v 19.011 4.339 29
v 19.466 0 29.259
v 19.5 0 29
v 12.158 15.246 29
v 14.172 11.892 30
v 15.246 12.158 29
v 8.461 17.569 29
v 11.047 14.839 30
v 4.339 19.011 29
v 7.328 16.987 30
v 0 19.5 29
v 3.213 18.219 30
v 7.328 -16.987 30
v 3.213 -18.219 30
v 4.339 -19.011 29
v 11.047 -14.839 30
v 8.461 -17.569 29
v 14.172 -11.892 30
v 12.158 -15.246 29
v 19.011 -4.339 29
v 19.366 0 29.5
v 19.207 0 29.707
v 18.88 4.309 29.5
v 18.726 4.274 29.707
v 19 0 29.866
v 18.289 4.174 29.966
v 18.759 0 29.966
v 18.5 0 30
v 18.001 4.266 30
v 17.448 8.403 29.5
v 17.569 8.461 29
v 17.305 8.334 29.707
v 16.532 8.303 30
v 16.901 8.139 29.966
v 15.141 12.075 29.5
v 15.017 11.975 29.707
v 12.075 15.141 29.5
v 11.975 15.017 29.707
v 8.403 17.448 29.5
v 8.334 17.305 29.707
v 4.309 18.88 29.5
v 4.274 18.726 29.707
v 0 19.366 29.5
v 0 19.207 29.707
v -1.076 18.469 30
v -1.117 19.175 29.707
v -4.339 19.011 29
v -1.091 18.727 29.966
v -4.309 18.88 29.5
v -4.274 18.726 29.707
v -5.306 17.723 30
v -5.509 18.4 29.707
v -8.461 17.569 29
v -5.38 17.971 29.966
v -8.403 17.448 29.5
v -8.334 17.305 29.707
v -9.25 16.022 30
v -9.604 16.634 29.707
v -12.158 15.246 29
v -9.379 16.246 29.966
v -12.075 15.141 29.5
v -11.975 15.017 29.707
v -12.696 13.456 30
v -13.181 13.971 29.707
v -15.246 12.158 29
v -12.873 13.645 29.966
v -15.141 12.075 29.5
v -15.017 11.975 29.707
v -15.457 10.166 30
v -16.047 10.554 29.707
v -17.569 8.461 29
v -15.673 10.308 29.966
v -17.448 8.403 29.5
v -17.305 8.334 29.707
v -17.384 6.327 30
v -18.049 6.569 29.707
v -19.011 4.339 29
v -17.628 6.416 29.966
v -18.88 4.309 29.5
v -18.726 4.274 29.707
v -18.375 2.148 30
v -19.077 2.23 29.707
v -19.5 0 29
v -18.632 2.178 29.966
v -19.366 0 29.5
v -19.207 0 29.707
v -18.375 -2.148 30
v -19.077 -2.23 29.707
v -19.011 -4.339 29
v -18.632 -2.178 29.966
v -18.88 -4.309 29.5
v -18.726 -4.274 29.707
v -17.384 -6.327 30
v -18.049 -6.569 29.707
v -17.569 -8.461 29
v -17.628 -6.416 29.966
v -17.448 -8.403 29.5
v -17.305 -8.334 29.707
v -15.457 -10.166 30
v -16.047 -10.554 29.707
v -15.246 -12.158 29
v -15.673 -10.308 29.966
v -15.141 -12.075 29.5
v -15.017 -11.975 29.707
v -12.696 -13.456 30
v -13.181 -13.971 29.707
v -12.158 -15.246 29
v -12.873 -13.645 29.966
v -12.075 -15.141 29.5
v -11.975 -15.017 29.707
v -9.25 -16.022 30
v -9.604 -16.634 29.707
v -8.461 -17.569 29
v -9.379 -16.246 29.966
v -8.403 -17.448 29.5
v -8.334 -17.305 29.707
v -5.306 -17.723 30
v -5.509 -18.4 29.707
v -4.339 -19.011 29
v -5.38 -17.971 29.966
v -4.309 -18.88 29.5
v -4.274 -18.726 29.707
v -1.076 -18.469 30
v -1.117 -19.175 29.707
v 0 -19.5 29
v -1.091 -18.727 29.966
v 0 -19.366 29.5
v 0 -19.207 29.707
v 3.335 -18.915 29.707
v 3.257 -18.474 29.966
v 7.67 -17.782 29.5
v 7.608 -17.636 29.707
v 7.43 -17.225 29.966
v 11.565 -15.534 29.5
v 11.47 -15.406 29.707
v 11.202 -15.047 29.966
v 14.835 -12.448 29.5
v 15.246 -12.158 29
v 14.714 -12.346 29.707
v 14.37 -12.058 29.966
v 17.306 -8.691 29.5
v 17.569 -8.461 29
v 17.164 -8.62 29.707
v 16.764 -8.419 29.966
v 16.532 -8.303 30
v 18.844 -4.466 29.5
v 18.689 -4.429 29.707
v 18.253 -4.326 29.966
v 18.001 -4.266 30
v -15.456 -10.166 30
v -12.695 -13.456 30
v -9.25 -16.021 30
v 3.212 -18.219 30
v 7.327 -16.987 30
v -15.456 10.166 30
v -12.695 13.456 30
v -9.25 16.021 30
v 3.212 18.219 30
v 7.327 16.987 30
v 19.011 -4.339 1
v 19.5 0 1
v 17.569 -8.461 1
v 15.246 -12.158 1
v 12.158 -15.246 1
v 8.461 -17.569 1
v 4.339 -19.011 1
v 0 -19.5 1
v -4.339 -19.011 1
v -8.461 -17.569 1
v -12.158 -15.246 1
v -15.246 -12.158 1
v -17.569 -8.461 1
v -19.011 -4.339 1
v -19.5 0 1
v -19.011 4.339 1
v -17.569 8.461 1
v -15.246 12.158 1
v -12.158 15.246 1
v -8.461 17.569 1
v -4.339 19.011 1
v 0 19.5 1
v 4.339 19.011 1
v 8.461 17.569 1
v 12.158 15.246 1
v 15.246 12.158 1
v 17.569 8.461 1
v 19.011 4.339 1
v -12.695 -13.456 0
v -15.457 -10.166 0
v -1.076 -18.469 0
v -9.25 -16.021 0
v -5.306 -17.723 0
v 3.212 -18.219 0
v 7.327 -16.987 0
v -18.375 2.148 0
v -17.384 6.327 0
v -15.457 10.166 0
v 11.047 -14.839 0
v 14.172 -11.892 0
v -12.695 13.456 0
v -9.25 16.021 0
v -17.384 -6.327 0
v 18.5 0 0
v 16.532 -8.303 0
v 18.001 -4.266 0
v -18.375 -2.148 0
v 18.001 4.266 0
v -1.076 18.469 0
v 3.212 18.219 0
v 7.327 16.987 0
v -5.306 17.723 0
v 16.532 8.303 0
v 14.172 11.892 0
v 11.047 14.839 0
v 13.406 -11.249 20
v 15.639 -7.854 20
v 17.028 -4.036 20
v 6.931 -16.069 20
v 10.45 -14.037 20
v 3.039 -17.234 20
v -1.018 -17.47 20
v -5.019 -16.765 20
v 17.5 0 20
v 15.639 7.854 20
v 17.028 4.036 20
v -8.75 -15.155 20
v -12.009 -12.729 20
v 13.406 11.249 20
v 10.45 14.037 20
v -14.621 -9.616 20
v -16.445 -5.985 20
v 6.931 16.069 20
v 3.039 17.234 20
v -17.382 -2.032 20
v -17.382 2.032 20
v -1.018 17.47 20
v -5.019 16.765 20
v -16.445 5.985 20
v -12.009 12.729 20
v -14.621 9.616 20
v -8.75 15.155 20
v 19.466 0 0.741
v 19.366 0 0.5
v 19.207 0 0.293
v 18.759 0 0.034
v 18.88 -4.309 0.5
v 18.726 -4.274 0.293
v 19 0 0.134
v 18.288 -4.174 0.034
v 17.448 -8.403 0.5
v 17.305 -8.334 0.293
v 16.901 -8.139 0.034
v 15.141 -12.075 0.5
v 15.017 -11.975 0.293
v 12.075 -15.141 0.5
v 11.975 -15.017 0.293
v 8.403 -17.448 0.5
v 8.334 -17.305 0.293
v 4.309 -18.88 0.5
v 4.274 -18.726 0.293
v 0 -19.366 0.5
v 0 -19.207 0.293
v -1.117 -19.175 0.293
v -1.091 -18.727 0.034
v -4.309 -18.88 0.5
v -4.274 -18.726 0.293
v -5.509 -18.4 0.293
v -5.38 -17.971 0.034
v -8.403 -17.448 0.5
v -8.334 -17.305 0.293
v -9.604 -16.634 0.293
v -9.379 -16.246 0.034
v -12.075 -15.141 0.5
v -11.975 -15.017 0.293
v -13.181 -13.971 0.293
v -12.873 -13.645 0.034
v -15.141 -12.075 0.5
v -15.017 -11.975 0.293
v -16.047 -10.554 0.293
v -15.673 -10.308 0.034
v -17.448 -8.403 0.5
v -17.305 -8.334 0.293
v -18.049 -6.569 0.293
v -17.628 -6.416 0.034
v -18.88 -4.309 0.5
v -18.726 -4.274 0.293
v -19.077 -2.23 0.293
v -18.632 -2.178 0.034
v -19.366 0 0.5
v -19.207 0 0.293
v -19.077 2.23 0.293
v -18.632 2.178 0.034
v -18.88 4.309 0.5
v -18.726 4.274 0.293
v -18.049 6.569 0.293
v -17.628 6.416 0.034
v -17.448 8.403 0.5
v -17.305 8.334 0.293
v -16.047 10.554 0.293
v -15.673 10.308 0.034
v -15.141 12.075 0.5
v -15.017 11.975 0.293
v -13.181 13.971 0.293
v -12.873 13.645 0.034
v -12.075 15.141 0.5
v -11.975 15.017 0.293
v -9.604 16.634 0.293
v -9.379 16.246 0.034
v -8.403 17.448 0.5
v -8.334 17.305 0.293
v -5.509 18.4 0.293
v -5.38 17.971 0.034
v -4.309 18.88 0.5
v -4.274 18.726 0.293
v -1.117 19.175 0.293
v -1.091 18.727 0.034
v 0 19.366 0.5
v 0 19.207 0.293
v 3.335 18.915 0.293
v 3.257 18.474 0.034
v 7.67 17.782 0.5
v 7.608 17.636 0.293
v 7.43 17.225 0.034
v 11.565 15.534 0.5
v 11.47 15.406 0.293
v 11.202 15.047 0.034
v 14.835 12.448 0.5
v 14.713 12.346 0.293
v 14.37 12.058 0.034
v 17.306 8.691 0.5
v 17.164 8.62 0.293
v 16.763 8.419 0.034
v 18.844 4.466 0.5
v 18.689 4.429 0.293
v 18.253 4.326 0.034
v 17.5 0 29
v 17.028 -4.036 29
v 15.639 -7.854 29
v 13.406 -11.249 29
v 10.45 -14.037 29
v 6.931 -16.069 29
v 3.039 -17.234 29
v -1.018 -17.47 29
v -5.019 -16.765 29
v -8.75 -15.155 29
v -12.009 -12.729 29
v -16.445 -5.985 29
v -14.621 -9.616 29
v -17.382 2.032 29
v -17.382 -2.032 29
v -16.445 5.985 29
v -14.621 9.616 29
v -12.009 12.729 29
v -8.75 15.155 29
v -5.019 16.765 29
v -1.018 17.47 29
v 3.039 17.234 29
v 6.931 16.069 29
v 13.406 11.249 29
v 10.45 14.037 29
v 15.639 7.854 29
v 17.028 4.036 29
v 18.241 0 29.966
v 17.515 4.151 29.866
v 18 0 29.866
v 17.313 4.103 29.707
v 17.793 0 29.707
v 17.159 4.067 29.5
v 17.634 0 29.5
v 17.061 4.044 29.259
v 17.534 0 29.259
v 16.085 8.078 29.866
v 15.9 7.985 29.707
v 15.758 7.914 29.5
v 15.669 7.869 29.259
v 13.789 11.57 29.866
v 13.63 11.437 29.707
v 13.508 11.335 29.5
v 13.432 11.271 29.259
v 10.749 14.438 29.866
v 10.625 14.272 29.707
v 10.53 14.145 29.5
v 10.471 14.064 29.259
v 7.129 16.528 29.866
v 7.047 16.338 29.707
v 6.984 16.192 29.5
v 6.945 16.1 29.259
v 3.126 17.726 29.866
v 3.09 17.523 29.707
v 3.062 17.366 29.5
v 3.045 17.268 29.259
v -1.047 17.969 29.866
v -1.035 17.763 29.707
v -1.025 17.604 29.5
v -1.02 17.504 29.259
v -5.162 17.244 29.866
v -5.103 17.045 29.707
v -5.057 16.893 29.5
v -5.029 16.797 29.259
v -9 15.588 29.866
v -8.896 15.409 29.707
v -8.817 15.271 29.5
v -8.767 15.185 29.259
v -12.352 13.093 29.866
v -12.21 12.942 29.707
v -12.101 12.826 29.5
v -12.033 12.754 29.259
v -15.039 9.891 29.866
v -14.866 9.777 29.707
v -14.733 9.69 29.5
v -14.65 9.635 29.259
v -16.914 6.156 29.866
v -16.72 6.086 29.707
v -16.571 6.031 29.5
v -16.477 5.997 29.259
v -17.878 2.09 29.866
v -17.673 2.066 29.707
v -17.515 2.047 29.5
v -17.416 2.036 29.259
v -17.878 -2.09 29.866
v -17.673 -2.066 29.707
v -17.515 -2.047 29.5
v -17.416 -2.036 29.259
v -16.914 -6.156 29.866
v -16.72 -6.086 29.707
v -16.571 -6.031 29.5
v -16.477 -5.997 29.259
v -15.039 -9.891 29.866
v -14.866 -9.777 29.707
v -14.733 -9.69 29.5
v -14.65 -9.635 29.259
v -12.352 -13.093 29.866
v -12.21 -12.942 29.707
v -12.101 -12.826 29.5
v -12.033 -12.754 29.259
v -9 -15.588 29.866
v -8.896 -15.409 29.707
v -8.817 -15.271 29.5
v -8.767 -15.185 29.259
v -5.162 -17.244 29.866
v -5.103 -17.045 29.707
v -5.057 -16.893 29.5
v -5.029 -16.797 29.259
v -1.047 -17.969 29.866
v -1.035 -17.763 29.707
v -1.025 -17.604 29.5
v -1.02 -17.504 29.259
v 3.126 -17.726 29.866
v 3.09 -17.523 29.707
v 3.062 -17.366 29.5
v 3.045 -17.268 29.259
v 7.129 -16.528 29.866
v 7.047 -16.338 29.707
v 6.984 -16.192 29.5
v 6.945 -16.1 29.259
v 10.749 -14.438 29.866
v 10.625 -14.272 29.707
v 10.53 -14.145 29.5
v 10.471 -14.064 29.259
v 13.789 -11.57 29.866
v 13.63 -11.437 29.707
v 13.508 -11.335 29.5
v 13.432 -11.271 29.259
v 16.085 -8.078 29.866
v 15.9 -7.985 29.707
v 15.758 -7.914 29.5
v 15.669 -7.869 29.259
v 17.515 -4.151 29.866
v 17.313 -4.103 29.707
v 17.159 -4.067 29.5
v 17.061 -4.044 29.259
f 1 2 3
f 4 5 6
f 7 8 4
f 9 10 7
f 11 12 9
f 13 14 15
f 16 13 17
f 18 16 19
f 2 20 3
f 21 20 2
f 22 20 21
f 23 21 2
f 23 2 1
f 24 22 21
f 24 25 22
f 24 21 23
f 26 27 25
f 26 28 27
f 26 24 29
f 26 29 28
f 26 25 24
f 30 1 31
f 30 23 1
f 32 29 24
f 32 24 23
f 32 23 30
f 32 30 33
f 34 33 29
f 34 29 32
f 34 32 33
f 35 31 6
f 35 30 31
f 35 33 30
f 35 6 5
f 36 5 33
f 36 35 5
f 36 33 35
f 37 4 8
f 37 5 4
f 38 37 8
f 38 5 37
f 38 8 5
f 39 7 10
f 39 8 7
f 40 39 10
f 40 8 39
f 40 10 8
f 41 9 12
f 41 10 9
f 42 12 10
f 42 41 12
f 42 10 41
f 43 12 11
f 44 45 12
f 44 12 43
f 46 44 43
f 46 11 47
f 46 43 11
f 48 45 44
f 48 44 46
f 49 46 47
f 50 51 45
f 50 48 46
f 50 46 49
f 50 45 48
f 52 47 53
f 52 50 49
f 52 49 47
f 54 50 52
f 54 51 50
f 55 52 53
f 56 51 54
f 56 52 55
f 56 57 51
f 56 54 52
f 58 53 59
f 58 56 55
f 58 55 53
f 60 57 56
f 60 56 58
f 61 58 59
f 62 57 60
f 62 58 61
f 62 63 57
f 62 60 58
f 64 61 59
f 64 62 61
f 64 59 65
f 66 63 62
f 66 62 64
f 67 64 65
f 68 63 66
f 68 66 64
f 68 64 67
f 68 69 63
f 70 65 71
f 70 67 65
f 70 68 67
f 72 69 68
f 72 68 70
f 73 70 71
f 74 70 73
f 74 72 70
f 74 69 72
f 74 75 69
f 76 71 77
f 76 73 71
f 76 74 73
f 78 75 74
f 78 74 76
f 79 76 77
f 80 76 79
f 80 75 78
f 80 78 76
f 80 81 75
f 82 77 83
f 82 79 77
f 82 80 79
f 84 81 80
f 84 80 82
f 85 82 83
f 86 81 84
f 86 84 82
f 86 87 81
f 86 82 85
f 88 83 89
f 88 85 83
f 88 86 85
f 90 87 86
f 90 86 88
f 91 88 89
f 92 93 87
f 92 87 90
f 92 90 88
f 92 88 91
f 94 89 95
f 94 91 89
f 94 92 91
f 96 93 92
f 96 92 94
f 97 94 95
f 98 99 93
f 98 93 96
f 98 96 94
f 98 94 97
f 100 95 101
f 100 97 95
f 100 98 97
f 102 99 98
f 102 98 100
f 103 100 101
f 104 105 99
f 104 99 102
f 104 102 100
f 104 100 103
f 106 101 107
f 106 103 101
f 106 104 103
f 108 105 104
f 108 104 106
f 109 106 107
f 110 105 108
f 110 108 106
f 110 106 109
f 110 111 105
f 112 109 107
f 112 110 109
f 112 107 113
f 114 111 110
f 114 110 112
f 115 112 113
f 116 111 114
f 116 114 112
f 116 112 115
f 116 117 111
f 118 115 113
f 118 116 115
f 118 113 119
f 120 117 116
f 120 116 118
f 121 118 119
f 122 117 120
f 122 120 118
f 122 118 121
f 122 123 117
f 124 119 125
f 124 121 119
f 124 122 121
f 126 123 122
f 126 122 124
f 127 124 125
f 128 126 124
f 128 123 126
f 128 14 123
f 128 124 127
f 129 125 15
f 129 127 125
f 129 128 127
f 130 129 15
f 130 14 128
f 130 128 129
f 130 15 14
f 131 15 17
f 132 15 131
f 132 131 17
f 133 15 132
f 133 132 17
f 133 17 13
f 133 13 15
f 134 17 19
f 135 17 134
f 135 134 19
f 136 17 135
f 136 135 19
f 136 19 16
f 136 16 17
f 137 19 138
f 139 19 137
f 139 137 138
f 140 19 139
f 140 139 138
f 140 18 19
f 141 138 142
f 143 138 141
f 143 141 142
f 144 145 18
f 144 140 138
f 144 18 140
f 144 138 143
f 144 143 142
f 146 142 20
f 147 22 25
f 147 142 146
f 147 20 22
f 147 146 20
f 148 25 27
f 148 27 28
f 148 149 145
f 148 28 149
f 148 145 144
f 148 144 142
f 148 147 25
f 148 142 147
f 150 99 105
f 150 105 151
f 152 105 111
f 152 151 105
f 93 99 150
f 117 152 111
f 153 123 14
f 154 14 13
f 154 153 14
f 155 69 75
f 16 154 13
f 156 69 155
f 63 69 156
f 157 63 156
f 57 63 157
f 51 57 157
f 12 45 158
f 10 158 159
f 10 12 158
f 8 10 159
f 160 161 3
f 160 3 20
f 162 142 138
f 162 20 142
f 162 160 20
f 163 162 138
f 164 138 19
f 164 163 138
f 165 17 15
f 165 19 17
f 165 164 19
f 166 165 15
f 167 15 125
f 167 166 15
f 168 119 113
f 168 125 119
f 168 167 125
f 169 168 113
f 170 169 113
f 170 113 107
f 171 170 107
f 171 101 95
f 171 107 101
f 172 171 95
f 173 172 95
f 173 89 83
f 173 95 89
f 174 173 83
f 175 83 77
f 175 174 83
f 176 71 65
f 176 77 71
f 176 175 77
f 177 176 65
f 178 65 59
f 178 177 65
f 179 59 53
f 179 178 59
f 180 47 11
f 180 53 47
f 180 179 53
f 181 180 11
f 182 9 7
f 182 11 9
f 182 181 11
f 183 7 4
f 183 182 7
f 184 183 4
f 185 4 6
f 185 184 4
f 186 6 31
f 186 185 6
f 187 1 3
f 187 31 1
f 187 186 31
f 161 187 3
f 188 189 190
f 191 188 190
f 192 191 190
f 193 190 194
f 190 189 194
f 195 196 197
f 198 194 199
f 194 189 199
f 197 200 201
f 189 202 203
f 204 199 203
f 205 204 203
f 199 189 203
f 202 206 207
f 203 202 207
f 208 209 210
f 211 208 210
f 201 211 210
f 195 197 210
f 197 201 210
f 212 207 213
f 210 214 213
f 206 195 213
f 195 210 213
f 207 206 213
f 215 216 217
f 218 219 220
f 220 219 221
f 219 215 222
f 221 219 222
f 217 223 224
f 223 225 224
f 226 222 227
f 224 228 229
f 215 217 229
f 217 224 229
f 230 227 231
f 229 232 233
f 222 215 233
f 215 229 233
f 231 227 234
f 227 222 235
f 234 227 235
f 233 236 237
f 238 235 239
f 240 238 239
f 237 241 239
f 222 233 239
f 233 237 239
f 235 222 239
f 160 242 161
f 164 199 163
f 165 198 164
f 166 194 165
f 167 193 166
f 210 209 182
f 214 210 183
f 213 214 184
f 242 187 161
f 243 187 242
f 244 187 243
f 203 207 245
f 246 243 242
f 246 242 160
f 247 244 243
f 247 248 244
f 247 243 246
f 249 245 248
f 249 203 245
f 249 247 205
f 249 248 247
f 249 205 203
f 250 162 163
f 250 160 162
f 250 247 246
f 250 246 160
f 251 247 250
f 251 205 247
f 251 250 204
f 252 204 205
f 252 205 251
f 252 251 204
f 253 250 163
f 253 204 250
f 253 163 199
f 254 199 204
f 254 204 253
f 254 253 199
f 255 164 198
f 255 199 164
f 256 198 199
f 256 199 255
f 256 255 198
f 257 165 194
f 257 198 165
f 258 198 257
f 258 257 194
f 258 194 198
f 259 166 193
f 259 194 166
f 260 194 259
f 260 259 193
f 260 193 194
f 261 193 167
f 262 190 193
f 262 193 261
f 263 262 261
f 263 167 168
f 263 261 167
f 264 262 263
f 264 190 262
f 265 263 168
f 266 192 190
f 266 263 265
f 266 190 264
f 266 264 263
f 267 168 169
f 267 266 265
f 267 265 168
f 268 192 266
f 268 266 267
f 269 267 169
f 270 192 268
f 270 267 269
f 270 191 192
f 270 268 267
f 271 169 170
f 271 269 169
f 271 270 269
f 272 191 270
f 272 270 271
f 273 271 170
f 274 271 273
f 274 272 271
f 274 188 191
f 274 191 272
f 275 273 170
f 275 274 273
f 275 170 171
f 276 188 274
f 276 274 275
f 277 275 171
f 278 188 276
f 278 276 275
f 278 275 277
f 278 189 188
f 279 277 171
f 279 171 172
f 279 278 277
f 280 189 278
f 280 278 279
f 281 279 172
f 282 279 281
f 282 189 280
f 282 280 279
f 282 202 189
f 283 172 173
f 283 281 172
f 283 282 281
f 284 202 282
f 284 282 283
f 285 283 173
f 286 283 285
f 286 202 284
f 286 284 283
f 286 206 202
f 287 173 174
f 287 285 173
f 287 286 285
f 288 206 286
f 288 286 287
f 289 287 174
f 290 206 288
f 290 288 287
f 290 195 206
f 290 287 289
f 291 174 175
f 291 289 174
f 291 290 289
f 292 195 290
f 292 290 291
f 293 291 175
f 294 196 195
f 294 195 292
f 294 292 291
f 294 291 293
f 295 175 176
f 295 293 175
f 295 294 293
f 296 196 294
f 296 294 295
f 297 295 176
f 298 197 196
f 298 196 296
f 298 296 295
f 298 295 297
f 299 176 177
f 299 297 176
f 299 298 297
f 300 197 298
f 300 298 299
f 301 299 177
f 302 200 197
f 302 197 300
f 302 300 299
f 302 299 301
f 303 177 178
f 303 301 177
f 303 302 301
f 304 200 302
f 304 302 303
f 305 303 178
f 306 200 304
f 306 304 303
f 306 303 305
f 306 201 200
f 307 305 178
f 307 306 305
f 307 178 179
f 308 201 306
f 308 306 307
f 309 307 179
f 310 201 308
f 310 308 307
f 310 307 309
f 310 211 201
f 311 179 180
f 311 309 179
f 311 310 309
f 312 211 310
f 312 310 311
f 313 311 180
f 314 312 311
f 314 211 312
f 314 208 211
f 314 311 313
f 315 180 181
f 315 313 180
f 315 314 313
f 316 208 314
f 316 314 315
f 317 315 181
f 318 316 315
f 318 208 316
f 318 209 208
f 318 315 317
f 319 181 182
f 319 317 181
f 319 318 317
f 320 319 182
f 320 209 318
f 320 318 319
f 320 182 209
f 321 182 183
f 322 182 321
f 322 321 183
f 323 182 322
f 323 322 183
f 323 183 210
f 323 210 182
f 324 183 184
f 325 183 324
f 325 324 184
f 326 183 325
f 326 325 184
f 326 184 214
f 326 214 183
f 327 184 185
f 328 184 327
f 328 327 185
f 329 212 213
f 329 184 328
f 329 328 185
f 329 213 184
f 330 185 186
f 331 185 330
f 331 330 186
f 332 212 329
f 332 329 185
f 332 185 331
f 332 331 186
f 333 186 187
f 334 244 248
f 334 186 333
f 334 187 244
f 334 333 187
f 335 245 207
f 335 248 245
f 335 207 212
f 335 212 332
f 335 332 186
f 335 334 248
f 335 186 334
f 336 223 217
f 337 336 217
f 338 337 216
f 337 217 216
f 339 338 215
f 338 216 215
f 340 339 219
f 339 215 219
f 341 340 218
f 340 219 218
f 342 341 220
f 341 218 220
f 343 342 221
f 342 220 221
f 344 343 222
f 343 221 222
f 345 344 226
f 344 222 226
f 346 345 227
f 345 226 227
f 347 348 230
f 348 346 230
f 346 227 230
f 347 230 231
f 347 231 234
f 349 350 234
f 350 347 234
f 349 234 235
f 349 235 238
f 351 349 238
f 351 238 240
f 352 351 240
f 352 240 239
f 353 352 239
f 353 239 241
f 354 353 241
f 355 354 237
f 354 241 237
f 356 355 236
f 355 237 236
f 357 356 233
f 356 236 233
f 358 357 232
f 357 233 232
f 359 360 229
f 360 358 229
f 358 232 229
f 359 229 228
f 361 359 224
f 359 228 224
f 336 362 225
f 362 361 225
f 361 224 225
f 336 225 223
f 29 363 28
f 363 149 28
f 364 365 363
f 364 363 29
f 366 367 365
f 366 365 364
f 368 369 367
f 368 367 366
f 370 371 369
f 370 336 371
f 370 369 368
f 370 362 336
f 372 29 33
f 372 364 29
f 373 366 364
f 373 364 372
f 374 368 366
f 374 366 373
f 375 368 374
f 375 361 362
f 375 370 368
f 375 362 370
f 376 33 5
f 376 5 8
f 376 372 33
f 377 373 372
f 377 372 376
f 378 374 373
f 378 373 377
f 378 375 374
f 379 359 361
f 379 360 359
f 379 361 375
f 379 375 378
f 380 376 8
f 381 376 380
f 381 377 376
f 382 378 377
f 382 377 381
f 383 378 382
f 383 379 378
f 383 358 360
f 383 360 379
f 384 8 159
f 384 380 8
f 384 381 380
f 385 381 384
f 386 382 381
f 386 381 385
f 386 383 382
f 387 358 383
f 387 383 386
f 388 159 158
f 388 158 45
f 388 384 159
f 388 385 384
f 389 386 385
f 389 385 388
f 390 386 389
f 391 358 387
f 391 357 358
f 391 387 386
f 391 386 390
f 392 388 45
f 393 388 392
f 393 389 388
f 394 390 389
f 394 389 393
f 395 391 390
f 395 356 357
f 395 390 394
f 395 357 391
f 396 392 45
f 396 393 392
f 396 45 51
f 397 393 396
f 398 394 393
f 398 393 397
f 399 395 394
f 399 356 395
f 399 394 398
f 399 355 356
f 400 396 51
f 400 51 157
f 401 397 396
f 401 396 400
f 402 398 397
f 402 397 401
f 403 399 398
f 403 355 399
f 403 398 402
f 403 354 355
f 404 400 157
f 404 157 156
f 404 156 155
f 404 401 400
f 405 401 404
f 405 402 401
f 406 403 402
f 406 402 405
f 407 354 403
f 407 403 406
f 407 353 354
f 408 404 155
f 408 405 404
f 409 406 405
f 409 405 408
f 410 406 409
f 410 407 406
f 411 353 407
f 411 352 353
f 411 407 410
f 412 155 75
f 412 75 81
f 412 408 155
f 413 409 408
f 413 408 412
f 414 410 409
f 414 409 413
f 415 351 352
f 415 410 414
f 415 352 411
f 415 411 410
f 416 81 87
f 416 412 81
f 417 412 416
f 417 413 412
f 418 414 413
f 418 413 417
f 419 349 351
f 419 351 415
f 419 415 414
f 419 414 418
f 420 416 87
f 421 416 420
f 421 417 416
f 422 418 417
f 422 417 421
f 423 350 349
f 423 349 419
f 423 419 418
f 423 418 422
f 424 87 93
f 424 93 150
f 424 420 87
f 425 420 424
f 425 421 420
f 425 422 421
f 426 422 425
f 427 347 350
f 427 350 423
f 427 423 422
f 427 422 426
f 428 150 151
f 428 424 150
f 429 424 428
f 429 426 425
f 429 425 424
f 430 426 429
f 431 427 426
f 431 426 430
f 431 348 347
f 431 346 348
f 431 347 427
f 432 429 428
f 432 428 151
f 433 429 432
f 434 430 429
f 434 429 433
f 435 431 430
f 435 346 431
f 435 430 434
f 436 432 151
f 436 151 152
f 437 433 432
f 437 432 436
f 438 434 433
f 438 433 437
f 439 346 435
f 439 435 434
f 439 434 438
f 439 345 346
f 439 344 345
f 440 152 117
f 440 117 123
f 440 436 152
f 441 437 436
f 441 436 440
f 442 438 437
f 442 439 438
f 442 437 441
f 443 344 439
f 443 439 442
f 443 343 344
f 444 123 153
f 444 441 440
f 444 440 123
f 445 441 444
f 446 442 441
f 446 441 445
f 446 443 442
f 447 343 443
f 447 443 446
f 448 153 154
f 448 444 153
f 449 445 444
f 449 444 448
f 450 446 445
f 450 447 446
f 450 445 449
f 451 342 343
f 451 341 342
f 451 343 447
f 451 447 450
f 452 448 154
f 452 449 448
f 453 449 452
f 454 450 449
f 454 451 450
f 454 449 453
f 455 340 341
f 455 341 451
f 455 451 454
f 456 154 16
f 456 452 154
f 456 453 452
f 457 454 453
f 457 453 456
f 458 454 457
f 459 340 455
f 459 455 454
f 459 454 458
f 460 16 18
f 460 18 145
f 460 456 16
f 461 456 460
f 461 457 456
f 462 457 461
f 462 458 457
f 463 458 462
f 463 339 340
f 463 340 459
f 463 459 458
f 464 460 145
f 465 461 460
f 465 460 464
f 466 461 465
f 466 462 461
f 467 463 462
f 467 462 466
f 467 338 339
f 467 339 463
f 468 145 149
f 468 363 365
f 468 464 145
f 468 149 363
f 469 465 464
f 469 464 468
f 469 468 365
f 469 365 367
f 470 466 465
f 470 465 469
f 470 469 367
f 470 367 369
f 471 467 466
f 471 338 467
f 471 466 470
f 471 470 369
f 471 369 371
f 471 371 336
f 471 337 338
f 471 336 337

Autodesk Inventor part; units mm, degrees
ref_plane "YZ Plane" through (0, 0, 0) normal (1, 0, 0) x (0, 1, 0)
ref_plane "XZ Plane" through (0, 0, 0) normal (0, 1, 0) x (-1, 0, 0)
ref_plane "XY Plane" through (0, 0, 0) normal (0, 0, 1) x (1, 0, 0)
sketch "Skizze2" plane through (0, 0, 0) normal (0, 0, 1) x (1, 0, 0)
  circle A0 centre (0, 0) radius 17.5
  circle A1 centre (0, 0) radius 19.5
  dimension "d0" = 35
  dimension "d1" = 39
extrude "Extrusion1" add sketch "Skizze2" along normal blind 30
sketch "Skizze3" plane through (0, 0, 0) normal (0, 0, -1) x (-1, 0, 0)
  circle A0 centre (0, 0) radius 17.5
extrude "Extrusion2" add sketch "Skizze3" against normal blind 20
fillet "Rundung1" radius 1 2 edges at (-17.5, 0, 30) (-19.5, 0, 30)
fillet "Rundung2" radius 1 1 edges at (-19.5, 0, 0)
properties part number "plug"
